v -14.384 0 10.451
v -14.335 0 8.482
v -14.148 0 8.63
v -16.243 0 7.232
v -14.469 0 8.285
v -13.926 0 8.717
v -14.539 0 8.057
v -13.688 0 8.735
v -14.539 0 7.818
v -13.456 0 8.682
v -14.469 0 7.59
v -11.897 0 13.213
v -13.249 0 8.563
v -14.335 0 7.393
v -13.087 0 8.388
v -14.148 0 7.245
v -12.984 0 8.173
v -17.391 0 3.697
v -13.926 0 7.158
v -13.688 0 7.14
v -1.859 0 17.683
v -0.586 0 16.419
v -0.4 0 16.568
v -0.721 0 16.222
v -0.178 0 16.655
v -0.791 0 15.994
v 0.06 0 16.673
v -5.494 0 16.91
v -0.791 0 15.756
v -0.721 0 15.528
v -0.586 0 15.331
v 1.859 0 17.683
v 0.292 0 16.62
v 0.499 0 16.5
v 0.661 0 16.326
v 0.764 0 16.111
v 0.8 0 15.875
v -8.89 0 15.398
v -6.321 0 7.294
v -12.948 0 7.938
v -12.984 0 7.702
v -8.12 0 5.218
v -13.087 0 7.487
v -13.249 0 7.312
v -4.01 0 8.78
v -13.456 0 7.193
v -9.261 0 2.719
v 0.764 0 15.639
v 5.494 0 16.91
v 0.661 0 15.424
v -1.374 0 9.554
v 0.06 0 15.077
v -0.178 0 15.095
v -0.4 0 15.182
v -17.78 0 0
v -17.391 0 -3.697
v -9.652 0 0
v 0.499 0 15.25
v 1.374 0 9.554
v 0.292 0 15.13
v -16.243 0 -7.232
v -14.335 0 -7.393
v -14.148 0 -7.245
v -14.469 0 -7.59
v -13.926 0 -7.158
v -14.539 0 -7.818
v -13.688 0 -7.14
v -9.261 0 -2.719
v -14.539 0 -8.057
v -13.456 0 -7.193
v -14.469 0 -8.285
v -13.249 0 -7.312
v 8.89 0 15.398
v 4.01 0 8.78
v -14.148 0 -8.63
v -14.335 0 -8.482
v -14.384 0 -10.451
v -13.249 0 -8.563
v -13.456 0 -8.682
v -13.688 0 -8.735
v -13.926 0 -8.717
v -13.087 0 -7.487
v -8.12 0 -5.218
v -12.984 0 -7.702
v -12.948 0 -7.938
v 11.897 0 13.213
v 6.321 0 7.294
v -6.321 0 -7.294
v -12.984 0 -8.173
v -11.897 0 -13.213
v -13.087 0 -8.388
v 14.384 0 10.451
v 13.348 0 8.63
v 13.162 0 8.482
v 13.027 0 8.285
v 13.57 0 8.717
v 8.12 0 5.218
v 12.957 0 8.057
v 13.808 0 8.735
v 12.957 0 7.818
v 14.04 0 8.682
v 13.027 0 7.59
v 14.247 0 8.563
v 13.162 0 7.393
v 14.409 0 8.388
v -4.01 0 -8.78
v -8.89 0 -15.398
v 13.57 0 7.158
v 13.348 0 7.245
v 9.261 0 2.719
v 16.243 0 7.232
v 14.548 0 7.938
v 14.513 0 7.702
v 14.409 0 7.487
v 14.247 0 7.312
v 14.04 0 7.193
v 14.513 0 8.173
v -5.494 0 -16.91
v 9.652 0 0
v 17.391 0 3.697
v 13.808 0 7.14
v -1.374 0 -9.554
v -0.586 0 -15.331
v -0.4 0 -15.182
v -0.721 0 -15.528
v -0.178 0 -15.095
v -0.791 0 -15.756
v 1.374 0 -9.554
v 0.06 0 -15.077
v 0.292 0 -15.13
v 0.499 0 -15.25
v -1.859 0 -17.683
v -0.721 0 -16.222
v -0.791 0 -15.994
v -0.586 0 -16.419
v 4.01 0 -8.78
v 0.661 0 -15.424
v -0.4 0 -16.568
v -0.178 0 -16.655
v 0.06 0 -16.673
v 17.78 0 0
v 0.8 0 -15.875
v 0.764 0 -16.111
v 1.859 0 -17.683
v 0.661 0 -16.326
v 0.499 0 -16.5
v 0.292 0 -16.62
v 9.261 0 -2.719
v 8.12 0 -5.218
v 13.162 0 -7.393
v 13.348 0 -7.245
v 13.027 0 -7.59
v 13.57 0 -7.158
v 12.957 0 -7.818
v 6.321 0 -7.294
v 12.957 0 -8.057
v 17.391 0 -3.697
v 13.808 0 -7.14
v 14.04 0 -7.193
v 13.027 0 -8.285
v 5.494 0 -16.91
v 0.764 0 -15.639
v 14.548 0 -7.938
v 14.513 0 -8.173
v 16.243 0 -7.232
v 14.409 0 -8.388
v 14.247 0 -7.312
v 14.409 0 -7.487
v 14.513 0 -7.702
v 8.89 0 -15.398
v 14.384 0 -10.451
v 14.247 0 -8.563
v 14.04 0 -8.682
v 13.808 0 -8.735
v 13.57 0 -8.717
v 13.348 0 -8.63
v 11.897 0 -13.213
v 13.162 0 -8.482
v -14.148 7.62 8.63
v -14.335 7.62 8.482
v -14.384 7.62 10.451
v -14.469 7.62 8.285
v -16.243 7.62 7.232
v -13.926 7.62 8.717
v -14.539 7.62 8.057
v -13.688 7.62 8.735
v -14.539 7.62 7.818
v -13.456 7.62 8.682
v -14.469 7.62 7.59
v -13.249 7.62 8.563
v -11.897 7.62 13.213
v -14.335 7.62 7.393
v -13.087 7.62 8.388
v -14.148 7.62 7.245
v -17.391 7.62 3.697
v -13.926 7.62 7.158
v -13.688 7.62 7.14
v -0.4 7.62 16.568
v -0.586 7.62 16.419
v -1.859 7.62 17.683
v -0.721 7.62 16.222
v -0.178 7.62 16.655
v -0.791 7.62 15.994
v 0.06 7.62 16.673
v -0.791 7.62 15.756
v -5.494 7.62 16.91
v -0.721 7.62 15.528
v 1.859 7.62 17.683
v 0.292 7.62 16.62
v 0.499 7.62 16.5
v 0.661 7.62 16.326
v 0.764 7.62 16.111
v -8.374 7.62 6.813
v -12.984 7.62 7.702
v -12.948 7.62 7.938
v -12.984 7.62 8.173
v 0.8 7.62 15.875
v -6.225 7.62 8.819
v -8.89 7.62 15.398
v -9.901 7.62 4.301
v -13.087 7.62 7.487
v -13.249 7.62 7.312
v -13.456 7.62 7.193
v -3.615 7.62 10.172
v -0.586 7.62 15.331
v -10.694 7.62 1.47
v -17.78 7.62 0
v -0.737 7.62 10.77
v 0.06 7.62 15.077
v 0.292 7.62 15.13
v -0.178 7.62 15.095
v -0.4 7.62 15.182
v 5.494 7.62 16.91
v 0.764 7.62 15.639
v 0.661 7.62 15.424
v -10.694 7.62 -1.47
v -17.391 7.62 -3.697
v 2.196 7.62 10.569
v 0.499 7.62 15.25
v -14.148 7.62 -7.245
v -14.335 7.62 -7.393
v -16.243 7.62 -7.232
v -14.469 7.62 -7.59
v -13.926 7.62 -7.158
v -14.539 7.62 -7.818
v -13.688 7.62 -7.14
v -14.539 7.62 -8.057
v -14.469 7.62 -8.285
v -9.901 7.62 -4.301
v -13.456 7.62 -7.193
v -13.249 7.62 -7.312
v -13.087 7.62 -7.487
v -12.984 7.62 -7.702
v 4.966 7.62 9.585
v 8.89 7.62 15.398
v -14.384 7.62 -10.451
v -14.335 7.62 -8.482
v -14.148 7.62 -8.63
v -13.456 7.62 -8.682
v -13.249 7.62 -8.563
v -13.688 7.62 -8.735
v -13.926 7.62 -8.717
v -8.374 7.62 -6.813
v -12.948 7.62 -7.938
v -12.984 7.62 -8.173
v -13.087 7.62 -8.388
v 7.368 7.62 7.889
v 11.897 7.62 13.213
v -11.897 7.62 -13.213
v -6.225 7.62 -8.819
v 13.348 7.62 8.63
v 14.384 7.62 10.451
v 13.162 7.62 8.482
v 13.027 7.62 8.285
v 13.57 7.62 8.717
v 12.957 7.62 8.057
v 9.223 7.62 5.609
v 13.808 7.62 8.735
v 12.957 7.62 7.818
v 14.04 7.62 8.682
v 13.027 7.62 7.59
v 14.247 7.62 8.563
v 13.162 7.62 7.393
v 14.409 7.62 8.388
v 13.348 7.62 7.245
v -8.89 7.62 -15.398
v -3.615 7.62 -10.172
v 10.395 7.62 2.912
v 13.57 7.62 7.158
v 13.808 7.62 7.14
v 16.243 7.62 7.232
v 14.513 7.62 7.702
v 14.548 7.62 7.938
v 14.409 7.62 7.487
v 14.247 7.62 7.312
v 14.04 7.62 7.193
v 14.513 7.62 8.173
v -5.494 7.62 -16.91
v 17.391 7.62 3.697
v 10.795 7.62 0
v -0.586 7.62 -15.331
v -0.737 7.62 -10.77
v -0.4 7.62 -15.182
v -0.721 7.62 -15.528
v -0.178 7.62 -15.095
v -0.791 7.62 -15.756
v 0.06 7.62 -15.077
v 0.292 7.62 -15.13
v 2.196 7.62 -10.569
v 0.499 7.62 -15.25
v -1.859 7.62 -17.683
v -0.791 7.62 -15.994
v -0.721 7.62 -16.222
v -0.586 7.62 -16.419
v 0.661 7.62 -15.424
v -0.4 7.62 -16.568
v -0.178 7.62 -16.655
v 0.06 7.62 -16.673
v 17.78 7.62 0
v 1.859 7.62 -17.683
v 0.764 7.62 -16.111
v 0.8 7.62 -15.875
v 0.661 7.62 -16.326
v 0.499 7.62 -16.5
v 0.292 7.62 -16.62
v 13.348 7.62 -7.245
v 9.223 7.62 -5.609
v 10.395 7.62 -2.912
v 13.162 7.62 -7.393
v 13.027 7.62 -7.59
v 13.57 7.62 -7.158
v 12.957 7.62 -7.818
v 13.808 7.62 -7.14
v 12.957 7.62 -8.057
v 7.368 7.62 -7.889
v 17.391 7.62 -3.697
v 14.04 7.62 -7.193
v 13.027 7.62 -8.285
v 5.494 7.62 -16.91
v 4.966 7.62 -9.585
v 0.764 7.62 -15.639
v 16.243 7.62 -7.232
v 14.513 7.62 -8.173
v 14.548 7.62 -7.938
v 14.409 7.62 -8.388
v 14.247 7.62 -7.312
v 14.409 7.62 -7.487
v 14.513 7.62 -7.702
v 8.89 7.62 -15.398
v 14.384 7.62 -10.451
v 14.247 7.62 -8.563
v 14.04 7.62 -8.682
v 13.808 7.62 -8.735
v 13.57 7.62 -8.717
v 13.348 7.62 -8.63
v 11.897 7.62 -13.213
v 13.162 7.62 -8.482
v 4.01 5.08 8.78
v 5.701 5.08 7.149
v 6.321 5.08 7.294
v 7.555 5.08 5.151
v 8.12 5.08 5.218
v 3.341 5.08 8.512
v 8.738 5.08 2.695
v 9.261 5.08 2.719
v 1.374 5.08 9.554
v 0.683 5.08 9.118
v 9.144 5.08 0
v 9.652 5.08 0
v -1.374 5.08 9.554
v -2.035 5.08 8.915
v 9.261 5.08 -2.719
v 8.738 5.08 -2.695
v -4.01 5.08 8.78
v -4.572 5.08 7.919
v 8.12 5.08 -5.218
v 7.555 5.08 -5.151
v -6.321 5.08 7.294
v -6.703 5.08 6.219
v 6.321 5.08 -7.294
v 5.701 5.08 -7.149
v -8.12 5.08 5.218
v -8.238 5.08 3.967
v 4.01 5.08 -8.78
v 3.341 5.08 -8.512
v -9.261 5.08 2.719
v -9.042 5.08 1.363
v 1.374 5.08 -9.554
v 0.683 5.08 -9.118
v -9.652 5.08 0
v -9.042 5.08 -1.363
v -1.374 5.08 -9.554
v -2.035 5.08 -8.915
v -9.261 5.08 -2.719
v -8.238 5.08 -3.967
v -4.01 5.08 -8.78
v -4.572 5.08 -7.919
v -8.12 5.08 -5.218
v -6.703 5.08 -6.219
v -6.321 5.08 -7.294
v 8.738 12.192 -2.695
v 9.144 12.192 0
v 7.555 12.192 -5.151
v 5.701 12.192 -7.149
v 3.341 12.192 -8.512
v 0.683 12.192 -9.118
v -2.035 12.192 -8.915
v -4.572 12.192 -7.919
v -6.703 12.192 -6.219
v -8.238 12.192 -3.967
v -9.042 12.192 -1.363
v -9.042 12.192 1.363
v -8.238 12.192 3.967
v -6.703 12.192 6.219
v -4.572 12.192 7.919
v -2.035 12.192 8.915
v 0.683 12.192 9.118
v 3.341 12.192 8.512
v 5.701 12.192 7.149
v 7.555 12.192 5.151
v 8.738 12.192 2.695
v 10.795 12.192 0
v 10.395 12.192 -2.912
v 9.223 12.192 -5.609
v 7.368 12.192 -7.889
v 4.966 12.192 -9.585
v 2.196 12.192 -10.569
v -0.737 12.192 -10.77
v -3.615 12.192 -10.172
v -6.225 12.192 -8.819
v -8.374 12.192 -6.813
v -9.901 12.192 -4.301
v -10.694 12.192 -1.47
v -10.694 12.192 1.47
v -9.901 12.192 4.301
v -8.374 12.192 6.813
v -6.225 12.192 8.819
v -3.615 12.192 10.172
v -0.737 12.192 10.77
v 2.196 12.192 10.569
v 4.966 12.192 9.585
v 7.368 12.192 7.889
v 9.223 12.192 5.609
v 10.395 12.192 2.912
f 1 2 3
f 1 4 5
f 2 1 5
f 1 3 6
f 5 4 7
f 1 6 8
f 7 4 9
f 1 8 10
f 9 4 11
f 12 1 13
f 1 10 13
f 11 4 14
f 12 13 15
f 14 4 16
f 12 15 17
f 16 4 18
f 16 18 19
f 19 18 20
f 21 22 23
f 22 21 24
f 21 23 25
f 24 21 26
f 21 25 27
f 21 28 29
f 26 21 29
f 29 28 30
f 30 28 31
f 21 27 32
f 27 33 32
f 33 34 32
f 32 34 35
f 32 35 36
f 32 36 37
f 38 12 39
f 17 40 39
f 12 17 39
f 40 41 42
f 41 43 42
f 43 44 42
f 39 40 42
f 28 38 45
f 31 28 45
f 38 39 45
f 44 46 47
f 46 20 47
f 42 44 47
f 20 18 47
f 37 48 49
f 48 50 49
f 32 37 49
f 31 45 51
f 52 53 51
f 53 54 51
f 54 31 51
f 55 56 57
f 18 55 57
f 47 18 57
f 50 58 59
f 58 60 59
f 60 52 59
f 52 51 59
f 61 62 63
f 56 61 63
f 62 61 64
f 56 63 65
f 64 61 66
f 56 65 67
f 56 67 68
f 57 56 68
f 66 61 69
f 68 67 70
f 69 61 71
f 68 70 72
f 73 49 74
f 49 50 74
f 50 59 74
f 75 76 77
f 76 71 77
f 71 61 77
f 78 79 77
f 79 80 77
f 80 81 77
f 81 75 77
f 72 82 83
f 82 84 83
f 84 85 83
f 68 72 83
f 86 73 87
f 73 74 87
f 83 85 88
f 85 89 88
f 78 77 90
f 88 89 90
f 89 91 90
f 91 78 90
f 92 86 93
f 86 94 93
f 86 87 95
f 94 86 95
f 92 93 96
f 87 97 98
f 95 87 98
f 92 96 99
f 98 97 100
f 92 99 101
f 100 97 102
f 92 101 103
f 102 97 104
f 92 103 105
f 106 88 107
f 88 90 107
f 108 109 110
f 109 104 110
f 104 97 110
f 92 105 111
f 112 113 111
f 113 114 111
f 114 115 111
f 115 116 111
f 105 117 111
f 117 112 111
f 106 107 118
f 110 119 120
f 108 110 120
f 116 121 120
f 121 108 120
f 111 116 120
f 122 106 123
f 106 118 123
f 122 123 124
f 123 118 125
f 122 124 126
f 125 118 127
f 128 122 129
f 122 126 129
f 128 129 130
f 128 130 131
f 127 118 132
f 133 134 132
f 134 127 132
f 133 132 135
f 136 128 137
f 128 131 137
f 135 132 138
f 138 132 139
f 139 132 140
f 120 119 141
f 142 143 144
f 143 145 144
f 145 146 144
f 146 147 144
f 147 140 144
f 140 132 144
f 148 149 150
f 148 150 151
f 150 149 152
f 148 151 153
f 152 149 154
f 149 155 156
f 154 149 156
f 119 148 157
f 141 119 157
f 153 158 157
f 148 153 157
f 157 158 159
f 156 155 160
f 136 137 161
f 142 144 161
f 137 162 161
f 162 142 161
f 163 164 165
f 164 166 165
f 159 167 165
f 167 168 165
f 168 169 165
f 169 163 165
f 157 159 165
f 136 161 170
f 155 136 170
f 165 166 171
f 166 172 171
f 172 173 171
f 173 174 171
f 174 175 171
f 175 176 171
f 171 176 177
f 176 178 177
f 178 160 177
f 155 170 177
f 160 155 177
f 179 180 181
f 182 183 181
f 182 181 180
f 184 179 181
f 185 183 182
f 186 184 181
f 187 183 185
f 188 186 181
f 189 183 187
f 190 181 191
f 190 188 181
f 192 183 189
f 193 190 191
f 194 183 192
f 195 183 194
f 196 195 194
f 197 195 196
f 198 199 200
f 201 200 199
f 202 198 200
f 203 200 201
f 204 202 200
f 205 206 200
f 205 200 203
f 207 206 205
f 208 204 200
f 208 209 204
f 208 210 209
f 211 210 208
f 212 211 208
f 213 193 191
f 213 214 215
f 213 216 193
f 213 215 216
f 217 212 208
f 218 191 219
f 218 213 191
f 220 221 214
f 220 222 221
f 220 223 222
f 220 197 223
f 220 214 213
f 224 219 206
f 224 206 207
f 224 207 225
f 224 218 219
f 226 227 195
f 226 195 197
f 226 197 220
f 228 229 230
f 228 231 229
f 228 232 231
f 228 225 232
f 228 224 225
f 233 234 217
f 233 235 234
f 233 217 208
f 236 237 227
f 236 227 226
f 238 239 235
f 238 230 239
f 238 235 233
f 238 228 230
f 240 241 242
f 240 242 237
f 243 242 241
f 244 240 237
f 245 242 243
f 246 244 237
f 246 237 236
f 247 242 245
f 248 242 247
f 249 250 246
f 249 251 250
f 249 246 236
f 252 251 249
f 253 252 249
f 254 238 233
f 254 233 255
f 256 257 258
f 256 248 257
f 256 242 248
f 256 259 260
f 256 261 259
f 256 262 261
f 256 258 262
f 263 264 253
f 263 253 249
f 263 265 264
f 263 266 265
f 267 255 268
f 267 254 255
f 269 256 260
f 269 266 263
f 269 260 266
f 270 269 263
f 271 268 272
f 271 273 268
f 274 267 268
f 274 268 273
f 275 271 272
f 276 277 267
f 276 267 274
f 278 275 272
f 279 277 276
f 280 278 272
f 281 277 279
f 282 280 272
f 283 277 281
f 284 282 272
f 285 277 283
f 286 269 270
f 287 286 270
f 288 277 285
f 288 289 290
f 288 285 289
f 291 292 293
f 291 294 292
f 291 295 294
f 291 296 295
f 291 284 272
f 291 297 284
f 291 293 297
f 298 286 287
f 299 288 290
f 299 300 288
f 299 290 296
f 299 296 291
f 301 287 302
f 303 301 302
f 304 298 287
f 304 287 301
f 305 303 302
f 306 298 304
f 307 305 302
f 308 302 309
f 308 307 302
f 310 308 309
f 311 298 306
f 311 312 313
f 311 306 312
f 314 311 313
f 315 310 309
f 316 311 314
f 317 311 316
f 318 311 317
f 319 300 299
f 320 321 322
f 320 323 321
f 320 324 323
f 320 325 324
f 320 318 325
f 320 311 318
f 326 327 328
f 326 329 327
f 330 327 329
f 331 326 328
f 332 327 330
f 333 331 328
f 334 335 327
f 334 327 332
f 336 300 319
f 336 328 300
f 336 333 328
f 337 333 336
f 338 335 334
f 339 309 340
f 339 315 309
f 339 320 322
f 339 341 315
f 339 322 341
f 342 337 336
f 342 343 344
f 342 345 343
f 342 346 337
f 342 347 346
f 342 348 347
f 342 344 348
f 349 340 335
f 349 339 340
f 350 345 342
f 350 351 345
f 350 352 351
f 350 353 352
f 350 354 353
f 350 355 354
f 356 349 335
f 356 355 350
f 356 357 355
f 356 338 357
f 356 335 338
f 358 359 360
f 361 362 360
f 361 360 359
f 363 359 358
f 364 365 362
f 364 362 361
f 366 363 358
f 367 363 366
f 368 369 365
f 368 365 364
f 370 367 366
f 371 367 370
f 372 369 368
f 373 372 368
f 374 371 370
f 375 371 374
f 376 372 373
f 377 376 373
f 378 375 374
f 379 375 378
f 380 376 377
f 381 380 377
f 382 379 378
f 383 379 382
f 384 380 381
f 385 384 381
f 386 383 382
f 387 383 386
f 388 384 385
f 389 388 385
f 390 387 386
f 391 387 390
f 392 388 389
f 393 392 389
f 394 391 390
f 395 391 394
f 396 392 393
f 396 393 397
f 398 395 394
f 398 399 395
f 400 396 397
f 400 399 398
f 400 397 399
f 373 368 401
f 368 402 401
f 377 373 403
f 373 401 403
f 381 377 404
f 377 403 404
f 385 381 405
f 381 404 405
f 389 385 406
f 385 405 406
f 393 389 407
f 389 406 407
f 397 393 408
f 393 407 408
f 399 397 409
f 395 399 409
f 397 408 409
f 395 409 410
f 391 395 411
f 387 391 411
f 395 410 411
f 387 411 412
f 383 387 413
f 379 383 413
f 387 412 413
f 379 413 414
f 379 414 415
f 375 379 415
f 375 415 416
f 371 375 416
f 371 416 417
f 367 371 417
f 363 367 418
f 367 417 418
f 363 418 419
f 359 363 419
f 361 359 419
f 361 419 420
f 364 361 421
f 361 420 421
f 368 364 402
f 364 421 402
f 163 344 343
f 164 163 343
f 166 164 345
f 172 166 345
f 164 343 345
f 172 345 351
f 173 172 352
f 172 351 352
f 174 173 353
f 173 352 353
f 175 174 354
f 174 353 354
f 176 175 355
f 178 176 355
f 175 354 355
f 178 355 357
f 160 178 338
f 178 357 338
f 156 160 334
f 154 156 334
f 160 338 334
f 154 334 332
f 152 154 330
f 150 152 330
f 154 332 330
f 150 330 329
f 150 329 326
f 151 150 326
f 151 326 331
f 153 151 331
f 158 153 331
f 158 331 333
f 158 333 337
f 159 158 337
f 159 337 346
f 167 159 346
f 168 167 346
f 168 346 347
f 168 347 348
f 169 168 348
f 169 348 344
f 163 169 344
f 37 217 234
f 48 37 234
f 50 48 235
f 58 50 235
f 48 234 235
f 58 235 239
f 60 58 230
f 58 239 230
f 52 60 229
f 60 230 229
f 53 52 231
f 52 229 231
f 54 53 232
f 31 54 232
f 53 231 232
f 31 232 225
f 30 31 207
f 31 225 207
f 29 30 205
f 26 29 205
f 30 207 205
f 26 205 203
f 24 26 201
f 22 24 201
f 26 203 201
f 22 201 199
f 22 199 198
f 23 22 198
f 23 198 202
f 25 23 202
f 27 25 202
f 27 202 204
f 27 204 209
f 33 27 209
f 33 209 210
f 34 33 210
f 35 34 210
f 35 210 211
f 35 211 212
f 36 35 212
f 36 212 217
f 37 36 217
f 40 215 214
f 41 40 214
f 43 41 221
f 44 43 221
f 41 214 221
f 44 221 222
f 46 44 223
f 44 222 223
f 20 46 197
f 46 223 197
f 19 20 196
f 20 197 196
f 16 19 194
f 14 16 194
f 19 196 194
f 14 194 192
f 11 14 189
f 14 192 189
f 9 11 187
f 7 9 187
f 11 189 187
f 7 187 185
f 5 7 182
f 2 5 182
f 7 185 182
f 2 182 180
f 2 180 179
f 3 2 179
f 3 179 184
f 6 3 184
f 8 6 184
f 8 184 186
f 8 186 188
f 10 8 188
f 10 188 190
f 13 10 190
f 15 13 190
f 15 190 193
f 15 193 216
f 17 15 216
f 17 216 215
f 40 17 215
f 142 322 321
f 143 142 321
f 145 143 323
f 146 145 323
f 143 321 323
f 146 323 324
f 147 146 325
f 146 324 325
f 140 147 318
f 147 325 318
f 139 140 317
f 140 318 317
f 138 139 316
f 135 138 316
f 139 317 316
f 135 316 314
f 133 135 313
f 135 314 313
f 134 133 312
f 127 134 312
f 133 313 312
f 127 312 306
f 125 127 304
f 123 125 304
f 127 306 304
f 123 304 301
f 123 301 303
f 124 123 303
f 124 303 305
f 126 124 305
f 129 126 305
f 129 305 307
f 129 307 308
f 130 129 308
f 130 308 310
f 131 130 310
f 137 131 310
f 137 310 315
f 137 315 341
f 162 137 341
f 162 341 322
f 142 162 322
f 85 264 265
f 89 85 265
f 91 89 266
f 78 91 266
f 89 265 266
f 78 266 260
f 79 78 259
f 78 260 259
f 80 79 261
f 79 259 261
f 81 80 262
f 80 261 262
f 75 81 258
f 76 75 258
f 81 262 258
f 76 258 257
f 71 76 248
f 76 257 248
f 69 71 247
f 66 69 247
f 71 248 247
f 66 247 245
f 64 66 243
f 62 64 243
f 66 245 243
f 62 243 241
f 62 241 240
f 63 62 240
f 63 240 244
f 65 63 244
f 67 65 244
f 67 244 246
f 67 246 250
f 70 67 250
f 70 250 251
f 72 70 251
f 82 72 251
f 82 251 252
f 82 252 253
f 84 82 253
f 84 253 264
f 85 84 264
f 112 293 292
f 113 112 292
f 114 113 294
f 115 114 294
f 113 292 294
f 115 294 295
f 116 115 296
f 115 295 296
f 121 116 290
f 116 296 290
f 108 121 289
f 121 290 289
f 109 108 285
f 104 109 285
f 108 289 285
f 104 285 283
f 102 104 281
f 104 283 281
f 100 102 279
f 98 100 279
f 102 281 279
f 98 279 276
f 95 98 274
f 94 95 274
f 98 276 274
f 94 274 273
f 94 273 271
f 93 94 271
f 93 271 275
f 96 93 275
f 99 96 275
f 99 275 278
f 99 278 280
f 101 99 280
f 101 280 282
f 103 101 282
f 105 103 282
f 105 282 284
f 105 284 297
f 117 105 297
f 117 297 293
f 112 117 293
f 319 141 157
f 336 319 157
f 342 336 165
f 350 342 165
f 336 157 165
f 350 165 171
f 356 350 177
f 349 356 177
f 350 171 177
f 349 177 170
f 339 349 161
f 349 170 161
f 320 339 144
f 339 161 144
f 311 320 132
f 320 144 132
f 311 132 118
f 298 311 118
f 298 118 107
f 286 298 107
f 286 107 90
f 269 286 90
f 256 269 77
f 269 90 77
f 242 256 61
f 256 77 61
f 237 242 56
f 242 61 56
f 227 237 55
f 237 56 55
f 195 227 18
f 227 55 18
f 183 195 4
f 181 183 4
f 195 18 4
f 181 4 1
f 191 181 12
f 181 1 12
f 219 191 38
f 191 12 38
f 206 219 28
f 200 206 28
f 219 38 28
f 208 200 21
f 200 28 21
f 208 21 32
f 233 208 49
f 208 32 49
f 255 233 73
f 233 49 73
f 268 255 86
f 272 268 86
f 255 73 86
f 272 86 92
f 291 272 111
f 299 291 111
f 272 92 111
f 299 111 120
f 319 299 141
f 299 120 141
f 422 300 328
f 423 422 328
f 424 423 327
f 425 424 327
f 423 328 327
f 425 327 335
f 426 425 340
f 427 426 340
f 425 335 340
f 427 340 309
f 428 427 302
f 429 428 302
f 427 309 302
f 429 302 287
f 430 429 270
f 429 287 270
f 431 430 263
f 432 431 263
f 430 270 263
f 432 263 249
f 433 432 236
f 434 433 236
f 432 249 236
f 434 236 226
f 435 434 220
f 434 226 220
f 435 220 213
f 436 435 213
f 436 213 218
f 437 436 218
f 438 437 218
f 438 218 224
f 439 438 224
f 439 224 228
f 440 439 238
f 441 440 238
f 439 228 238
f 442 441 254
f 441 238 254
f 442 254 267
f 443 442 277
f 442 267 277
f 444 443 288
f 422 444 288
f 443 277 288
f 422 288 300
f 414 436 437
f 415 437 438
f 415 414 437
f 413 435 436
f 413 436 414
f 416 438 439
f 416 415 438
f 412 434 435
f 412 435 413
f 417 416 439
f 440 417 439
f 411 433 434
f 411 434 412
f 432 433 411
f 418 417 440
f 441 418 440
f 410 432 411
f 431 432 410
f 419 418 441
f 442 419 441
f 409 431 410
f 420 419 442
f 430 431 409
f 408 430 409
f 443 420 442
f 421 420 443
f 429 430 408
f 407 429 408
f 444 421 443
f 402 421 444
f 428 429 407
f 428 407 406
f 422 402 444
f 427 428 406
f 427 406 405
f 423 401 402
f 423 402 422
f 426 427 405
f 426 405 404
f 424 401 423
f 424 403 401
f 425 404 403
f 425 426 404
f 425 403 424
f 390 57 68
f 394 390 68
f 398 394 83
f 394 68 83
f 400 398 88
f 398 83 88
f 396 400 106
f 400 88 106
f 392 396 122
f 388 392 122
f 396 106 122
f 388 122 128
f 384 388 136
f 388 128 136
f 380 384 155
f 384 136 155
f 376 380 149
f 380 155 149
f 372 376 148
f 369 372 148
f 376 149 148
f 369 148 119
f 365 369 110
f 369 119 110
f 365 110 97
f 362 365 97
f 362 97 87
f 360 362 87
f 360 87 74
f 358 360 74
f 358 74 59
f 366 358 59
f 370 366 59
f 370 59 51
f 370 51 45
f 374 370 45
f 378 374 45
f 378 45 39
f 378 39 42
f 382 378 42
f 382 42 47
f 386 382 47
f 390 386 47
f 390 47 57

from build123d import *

# Parameters (mm, degrees)
SKETCH1_R                               = 17.78
BOSS_EXTRUDE1_DEPTH                     = 7.62
SKETCH2_R                               = 10.795
BOSS_EXTRUDE2_DEPTH                     = 4.572
M2X0_4_TAPPED_HOLE1_D                   = 1.6
CBORE_FOR_M5_HEX_HEAD_BOLT1_D           = 18.288
CBORE_FOR_M5_HEX_HEAD_BOLT1_CBORE_D     = 19.304
CBORE_FOR_M5_HEX_HEAD_BOLT1_CBORE_DEPTH = 5.08


with BuildPart() as part:
    # Sketch1 → Boss-Extrude1 (new body)
    with BuildSketch(Plane(origin=(0, 0, 0), x_dir=(1, 0, 0), z_dir=(0, 1, 0))):
        Circle(SKETCH1_R)
    extrude(amount=BOSS_EXTRUDE1_DEPTH)

    # Sketch2 → Boss-Extrude2 (add)
    with BuildSketch(Plane(origin=(0, 7.62, 0), x_dir=(1, 0, 0), z_dir=(0, 1, 0))):
        Circle(SKETCH2_R)
    extrude(amount=BOSS_EXTRUDE2_DEPTH)

    # M2x0.4 Tapped Hole1 (through all)
    with Locations(Plane(origin=(0, 0, 0), x_dir=(-1, 0, 0), z_dir=(0, -1, 0))):
        with Locations((0, 15.875), (13.748153285, 7.9375), (13.748153285, -7.9375), (0, -15.875), (-13.748153285, -7.9375), (-13.748153285, 7.9375)):
            Hole(M2X0_4_TAPPED_HOLE1_D / 2)

    # CBORE for M5 Hex Head Bolt1 (through all)
    with Locations(Plane(origin=(0, 0, 0), x_dir=(-1, 0, 0), z_dir=(0, -1, 0))):
        with Locations((0, 0)):
            CounterBoreHole(CBORE_FOR_M5_HEX_HEAD_BOLT1_D / 2, CBORE_FOR_M5_HEX_HEAD_BOLT1_CBORE_D / 2, CBORE_FOR_M5_HEX_HEAD_BOLT1_CBORE_DEPTH)


solid = part.part
